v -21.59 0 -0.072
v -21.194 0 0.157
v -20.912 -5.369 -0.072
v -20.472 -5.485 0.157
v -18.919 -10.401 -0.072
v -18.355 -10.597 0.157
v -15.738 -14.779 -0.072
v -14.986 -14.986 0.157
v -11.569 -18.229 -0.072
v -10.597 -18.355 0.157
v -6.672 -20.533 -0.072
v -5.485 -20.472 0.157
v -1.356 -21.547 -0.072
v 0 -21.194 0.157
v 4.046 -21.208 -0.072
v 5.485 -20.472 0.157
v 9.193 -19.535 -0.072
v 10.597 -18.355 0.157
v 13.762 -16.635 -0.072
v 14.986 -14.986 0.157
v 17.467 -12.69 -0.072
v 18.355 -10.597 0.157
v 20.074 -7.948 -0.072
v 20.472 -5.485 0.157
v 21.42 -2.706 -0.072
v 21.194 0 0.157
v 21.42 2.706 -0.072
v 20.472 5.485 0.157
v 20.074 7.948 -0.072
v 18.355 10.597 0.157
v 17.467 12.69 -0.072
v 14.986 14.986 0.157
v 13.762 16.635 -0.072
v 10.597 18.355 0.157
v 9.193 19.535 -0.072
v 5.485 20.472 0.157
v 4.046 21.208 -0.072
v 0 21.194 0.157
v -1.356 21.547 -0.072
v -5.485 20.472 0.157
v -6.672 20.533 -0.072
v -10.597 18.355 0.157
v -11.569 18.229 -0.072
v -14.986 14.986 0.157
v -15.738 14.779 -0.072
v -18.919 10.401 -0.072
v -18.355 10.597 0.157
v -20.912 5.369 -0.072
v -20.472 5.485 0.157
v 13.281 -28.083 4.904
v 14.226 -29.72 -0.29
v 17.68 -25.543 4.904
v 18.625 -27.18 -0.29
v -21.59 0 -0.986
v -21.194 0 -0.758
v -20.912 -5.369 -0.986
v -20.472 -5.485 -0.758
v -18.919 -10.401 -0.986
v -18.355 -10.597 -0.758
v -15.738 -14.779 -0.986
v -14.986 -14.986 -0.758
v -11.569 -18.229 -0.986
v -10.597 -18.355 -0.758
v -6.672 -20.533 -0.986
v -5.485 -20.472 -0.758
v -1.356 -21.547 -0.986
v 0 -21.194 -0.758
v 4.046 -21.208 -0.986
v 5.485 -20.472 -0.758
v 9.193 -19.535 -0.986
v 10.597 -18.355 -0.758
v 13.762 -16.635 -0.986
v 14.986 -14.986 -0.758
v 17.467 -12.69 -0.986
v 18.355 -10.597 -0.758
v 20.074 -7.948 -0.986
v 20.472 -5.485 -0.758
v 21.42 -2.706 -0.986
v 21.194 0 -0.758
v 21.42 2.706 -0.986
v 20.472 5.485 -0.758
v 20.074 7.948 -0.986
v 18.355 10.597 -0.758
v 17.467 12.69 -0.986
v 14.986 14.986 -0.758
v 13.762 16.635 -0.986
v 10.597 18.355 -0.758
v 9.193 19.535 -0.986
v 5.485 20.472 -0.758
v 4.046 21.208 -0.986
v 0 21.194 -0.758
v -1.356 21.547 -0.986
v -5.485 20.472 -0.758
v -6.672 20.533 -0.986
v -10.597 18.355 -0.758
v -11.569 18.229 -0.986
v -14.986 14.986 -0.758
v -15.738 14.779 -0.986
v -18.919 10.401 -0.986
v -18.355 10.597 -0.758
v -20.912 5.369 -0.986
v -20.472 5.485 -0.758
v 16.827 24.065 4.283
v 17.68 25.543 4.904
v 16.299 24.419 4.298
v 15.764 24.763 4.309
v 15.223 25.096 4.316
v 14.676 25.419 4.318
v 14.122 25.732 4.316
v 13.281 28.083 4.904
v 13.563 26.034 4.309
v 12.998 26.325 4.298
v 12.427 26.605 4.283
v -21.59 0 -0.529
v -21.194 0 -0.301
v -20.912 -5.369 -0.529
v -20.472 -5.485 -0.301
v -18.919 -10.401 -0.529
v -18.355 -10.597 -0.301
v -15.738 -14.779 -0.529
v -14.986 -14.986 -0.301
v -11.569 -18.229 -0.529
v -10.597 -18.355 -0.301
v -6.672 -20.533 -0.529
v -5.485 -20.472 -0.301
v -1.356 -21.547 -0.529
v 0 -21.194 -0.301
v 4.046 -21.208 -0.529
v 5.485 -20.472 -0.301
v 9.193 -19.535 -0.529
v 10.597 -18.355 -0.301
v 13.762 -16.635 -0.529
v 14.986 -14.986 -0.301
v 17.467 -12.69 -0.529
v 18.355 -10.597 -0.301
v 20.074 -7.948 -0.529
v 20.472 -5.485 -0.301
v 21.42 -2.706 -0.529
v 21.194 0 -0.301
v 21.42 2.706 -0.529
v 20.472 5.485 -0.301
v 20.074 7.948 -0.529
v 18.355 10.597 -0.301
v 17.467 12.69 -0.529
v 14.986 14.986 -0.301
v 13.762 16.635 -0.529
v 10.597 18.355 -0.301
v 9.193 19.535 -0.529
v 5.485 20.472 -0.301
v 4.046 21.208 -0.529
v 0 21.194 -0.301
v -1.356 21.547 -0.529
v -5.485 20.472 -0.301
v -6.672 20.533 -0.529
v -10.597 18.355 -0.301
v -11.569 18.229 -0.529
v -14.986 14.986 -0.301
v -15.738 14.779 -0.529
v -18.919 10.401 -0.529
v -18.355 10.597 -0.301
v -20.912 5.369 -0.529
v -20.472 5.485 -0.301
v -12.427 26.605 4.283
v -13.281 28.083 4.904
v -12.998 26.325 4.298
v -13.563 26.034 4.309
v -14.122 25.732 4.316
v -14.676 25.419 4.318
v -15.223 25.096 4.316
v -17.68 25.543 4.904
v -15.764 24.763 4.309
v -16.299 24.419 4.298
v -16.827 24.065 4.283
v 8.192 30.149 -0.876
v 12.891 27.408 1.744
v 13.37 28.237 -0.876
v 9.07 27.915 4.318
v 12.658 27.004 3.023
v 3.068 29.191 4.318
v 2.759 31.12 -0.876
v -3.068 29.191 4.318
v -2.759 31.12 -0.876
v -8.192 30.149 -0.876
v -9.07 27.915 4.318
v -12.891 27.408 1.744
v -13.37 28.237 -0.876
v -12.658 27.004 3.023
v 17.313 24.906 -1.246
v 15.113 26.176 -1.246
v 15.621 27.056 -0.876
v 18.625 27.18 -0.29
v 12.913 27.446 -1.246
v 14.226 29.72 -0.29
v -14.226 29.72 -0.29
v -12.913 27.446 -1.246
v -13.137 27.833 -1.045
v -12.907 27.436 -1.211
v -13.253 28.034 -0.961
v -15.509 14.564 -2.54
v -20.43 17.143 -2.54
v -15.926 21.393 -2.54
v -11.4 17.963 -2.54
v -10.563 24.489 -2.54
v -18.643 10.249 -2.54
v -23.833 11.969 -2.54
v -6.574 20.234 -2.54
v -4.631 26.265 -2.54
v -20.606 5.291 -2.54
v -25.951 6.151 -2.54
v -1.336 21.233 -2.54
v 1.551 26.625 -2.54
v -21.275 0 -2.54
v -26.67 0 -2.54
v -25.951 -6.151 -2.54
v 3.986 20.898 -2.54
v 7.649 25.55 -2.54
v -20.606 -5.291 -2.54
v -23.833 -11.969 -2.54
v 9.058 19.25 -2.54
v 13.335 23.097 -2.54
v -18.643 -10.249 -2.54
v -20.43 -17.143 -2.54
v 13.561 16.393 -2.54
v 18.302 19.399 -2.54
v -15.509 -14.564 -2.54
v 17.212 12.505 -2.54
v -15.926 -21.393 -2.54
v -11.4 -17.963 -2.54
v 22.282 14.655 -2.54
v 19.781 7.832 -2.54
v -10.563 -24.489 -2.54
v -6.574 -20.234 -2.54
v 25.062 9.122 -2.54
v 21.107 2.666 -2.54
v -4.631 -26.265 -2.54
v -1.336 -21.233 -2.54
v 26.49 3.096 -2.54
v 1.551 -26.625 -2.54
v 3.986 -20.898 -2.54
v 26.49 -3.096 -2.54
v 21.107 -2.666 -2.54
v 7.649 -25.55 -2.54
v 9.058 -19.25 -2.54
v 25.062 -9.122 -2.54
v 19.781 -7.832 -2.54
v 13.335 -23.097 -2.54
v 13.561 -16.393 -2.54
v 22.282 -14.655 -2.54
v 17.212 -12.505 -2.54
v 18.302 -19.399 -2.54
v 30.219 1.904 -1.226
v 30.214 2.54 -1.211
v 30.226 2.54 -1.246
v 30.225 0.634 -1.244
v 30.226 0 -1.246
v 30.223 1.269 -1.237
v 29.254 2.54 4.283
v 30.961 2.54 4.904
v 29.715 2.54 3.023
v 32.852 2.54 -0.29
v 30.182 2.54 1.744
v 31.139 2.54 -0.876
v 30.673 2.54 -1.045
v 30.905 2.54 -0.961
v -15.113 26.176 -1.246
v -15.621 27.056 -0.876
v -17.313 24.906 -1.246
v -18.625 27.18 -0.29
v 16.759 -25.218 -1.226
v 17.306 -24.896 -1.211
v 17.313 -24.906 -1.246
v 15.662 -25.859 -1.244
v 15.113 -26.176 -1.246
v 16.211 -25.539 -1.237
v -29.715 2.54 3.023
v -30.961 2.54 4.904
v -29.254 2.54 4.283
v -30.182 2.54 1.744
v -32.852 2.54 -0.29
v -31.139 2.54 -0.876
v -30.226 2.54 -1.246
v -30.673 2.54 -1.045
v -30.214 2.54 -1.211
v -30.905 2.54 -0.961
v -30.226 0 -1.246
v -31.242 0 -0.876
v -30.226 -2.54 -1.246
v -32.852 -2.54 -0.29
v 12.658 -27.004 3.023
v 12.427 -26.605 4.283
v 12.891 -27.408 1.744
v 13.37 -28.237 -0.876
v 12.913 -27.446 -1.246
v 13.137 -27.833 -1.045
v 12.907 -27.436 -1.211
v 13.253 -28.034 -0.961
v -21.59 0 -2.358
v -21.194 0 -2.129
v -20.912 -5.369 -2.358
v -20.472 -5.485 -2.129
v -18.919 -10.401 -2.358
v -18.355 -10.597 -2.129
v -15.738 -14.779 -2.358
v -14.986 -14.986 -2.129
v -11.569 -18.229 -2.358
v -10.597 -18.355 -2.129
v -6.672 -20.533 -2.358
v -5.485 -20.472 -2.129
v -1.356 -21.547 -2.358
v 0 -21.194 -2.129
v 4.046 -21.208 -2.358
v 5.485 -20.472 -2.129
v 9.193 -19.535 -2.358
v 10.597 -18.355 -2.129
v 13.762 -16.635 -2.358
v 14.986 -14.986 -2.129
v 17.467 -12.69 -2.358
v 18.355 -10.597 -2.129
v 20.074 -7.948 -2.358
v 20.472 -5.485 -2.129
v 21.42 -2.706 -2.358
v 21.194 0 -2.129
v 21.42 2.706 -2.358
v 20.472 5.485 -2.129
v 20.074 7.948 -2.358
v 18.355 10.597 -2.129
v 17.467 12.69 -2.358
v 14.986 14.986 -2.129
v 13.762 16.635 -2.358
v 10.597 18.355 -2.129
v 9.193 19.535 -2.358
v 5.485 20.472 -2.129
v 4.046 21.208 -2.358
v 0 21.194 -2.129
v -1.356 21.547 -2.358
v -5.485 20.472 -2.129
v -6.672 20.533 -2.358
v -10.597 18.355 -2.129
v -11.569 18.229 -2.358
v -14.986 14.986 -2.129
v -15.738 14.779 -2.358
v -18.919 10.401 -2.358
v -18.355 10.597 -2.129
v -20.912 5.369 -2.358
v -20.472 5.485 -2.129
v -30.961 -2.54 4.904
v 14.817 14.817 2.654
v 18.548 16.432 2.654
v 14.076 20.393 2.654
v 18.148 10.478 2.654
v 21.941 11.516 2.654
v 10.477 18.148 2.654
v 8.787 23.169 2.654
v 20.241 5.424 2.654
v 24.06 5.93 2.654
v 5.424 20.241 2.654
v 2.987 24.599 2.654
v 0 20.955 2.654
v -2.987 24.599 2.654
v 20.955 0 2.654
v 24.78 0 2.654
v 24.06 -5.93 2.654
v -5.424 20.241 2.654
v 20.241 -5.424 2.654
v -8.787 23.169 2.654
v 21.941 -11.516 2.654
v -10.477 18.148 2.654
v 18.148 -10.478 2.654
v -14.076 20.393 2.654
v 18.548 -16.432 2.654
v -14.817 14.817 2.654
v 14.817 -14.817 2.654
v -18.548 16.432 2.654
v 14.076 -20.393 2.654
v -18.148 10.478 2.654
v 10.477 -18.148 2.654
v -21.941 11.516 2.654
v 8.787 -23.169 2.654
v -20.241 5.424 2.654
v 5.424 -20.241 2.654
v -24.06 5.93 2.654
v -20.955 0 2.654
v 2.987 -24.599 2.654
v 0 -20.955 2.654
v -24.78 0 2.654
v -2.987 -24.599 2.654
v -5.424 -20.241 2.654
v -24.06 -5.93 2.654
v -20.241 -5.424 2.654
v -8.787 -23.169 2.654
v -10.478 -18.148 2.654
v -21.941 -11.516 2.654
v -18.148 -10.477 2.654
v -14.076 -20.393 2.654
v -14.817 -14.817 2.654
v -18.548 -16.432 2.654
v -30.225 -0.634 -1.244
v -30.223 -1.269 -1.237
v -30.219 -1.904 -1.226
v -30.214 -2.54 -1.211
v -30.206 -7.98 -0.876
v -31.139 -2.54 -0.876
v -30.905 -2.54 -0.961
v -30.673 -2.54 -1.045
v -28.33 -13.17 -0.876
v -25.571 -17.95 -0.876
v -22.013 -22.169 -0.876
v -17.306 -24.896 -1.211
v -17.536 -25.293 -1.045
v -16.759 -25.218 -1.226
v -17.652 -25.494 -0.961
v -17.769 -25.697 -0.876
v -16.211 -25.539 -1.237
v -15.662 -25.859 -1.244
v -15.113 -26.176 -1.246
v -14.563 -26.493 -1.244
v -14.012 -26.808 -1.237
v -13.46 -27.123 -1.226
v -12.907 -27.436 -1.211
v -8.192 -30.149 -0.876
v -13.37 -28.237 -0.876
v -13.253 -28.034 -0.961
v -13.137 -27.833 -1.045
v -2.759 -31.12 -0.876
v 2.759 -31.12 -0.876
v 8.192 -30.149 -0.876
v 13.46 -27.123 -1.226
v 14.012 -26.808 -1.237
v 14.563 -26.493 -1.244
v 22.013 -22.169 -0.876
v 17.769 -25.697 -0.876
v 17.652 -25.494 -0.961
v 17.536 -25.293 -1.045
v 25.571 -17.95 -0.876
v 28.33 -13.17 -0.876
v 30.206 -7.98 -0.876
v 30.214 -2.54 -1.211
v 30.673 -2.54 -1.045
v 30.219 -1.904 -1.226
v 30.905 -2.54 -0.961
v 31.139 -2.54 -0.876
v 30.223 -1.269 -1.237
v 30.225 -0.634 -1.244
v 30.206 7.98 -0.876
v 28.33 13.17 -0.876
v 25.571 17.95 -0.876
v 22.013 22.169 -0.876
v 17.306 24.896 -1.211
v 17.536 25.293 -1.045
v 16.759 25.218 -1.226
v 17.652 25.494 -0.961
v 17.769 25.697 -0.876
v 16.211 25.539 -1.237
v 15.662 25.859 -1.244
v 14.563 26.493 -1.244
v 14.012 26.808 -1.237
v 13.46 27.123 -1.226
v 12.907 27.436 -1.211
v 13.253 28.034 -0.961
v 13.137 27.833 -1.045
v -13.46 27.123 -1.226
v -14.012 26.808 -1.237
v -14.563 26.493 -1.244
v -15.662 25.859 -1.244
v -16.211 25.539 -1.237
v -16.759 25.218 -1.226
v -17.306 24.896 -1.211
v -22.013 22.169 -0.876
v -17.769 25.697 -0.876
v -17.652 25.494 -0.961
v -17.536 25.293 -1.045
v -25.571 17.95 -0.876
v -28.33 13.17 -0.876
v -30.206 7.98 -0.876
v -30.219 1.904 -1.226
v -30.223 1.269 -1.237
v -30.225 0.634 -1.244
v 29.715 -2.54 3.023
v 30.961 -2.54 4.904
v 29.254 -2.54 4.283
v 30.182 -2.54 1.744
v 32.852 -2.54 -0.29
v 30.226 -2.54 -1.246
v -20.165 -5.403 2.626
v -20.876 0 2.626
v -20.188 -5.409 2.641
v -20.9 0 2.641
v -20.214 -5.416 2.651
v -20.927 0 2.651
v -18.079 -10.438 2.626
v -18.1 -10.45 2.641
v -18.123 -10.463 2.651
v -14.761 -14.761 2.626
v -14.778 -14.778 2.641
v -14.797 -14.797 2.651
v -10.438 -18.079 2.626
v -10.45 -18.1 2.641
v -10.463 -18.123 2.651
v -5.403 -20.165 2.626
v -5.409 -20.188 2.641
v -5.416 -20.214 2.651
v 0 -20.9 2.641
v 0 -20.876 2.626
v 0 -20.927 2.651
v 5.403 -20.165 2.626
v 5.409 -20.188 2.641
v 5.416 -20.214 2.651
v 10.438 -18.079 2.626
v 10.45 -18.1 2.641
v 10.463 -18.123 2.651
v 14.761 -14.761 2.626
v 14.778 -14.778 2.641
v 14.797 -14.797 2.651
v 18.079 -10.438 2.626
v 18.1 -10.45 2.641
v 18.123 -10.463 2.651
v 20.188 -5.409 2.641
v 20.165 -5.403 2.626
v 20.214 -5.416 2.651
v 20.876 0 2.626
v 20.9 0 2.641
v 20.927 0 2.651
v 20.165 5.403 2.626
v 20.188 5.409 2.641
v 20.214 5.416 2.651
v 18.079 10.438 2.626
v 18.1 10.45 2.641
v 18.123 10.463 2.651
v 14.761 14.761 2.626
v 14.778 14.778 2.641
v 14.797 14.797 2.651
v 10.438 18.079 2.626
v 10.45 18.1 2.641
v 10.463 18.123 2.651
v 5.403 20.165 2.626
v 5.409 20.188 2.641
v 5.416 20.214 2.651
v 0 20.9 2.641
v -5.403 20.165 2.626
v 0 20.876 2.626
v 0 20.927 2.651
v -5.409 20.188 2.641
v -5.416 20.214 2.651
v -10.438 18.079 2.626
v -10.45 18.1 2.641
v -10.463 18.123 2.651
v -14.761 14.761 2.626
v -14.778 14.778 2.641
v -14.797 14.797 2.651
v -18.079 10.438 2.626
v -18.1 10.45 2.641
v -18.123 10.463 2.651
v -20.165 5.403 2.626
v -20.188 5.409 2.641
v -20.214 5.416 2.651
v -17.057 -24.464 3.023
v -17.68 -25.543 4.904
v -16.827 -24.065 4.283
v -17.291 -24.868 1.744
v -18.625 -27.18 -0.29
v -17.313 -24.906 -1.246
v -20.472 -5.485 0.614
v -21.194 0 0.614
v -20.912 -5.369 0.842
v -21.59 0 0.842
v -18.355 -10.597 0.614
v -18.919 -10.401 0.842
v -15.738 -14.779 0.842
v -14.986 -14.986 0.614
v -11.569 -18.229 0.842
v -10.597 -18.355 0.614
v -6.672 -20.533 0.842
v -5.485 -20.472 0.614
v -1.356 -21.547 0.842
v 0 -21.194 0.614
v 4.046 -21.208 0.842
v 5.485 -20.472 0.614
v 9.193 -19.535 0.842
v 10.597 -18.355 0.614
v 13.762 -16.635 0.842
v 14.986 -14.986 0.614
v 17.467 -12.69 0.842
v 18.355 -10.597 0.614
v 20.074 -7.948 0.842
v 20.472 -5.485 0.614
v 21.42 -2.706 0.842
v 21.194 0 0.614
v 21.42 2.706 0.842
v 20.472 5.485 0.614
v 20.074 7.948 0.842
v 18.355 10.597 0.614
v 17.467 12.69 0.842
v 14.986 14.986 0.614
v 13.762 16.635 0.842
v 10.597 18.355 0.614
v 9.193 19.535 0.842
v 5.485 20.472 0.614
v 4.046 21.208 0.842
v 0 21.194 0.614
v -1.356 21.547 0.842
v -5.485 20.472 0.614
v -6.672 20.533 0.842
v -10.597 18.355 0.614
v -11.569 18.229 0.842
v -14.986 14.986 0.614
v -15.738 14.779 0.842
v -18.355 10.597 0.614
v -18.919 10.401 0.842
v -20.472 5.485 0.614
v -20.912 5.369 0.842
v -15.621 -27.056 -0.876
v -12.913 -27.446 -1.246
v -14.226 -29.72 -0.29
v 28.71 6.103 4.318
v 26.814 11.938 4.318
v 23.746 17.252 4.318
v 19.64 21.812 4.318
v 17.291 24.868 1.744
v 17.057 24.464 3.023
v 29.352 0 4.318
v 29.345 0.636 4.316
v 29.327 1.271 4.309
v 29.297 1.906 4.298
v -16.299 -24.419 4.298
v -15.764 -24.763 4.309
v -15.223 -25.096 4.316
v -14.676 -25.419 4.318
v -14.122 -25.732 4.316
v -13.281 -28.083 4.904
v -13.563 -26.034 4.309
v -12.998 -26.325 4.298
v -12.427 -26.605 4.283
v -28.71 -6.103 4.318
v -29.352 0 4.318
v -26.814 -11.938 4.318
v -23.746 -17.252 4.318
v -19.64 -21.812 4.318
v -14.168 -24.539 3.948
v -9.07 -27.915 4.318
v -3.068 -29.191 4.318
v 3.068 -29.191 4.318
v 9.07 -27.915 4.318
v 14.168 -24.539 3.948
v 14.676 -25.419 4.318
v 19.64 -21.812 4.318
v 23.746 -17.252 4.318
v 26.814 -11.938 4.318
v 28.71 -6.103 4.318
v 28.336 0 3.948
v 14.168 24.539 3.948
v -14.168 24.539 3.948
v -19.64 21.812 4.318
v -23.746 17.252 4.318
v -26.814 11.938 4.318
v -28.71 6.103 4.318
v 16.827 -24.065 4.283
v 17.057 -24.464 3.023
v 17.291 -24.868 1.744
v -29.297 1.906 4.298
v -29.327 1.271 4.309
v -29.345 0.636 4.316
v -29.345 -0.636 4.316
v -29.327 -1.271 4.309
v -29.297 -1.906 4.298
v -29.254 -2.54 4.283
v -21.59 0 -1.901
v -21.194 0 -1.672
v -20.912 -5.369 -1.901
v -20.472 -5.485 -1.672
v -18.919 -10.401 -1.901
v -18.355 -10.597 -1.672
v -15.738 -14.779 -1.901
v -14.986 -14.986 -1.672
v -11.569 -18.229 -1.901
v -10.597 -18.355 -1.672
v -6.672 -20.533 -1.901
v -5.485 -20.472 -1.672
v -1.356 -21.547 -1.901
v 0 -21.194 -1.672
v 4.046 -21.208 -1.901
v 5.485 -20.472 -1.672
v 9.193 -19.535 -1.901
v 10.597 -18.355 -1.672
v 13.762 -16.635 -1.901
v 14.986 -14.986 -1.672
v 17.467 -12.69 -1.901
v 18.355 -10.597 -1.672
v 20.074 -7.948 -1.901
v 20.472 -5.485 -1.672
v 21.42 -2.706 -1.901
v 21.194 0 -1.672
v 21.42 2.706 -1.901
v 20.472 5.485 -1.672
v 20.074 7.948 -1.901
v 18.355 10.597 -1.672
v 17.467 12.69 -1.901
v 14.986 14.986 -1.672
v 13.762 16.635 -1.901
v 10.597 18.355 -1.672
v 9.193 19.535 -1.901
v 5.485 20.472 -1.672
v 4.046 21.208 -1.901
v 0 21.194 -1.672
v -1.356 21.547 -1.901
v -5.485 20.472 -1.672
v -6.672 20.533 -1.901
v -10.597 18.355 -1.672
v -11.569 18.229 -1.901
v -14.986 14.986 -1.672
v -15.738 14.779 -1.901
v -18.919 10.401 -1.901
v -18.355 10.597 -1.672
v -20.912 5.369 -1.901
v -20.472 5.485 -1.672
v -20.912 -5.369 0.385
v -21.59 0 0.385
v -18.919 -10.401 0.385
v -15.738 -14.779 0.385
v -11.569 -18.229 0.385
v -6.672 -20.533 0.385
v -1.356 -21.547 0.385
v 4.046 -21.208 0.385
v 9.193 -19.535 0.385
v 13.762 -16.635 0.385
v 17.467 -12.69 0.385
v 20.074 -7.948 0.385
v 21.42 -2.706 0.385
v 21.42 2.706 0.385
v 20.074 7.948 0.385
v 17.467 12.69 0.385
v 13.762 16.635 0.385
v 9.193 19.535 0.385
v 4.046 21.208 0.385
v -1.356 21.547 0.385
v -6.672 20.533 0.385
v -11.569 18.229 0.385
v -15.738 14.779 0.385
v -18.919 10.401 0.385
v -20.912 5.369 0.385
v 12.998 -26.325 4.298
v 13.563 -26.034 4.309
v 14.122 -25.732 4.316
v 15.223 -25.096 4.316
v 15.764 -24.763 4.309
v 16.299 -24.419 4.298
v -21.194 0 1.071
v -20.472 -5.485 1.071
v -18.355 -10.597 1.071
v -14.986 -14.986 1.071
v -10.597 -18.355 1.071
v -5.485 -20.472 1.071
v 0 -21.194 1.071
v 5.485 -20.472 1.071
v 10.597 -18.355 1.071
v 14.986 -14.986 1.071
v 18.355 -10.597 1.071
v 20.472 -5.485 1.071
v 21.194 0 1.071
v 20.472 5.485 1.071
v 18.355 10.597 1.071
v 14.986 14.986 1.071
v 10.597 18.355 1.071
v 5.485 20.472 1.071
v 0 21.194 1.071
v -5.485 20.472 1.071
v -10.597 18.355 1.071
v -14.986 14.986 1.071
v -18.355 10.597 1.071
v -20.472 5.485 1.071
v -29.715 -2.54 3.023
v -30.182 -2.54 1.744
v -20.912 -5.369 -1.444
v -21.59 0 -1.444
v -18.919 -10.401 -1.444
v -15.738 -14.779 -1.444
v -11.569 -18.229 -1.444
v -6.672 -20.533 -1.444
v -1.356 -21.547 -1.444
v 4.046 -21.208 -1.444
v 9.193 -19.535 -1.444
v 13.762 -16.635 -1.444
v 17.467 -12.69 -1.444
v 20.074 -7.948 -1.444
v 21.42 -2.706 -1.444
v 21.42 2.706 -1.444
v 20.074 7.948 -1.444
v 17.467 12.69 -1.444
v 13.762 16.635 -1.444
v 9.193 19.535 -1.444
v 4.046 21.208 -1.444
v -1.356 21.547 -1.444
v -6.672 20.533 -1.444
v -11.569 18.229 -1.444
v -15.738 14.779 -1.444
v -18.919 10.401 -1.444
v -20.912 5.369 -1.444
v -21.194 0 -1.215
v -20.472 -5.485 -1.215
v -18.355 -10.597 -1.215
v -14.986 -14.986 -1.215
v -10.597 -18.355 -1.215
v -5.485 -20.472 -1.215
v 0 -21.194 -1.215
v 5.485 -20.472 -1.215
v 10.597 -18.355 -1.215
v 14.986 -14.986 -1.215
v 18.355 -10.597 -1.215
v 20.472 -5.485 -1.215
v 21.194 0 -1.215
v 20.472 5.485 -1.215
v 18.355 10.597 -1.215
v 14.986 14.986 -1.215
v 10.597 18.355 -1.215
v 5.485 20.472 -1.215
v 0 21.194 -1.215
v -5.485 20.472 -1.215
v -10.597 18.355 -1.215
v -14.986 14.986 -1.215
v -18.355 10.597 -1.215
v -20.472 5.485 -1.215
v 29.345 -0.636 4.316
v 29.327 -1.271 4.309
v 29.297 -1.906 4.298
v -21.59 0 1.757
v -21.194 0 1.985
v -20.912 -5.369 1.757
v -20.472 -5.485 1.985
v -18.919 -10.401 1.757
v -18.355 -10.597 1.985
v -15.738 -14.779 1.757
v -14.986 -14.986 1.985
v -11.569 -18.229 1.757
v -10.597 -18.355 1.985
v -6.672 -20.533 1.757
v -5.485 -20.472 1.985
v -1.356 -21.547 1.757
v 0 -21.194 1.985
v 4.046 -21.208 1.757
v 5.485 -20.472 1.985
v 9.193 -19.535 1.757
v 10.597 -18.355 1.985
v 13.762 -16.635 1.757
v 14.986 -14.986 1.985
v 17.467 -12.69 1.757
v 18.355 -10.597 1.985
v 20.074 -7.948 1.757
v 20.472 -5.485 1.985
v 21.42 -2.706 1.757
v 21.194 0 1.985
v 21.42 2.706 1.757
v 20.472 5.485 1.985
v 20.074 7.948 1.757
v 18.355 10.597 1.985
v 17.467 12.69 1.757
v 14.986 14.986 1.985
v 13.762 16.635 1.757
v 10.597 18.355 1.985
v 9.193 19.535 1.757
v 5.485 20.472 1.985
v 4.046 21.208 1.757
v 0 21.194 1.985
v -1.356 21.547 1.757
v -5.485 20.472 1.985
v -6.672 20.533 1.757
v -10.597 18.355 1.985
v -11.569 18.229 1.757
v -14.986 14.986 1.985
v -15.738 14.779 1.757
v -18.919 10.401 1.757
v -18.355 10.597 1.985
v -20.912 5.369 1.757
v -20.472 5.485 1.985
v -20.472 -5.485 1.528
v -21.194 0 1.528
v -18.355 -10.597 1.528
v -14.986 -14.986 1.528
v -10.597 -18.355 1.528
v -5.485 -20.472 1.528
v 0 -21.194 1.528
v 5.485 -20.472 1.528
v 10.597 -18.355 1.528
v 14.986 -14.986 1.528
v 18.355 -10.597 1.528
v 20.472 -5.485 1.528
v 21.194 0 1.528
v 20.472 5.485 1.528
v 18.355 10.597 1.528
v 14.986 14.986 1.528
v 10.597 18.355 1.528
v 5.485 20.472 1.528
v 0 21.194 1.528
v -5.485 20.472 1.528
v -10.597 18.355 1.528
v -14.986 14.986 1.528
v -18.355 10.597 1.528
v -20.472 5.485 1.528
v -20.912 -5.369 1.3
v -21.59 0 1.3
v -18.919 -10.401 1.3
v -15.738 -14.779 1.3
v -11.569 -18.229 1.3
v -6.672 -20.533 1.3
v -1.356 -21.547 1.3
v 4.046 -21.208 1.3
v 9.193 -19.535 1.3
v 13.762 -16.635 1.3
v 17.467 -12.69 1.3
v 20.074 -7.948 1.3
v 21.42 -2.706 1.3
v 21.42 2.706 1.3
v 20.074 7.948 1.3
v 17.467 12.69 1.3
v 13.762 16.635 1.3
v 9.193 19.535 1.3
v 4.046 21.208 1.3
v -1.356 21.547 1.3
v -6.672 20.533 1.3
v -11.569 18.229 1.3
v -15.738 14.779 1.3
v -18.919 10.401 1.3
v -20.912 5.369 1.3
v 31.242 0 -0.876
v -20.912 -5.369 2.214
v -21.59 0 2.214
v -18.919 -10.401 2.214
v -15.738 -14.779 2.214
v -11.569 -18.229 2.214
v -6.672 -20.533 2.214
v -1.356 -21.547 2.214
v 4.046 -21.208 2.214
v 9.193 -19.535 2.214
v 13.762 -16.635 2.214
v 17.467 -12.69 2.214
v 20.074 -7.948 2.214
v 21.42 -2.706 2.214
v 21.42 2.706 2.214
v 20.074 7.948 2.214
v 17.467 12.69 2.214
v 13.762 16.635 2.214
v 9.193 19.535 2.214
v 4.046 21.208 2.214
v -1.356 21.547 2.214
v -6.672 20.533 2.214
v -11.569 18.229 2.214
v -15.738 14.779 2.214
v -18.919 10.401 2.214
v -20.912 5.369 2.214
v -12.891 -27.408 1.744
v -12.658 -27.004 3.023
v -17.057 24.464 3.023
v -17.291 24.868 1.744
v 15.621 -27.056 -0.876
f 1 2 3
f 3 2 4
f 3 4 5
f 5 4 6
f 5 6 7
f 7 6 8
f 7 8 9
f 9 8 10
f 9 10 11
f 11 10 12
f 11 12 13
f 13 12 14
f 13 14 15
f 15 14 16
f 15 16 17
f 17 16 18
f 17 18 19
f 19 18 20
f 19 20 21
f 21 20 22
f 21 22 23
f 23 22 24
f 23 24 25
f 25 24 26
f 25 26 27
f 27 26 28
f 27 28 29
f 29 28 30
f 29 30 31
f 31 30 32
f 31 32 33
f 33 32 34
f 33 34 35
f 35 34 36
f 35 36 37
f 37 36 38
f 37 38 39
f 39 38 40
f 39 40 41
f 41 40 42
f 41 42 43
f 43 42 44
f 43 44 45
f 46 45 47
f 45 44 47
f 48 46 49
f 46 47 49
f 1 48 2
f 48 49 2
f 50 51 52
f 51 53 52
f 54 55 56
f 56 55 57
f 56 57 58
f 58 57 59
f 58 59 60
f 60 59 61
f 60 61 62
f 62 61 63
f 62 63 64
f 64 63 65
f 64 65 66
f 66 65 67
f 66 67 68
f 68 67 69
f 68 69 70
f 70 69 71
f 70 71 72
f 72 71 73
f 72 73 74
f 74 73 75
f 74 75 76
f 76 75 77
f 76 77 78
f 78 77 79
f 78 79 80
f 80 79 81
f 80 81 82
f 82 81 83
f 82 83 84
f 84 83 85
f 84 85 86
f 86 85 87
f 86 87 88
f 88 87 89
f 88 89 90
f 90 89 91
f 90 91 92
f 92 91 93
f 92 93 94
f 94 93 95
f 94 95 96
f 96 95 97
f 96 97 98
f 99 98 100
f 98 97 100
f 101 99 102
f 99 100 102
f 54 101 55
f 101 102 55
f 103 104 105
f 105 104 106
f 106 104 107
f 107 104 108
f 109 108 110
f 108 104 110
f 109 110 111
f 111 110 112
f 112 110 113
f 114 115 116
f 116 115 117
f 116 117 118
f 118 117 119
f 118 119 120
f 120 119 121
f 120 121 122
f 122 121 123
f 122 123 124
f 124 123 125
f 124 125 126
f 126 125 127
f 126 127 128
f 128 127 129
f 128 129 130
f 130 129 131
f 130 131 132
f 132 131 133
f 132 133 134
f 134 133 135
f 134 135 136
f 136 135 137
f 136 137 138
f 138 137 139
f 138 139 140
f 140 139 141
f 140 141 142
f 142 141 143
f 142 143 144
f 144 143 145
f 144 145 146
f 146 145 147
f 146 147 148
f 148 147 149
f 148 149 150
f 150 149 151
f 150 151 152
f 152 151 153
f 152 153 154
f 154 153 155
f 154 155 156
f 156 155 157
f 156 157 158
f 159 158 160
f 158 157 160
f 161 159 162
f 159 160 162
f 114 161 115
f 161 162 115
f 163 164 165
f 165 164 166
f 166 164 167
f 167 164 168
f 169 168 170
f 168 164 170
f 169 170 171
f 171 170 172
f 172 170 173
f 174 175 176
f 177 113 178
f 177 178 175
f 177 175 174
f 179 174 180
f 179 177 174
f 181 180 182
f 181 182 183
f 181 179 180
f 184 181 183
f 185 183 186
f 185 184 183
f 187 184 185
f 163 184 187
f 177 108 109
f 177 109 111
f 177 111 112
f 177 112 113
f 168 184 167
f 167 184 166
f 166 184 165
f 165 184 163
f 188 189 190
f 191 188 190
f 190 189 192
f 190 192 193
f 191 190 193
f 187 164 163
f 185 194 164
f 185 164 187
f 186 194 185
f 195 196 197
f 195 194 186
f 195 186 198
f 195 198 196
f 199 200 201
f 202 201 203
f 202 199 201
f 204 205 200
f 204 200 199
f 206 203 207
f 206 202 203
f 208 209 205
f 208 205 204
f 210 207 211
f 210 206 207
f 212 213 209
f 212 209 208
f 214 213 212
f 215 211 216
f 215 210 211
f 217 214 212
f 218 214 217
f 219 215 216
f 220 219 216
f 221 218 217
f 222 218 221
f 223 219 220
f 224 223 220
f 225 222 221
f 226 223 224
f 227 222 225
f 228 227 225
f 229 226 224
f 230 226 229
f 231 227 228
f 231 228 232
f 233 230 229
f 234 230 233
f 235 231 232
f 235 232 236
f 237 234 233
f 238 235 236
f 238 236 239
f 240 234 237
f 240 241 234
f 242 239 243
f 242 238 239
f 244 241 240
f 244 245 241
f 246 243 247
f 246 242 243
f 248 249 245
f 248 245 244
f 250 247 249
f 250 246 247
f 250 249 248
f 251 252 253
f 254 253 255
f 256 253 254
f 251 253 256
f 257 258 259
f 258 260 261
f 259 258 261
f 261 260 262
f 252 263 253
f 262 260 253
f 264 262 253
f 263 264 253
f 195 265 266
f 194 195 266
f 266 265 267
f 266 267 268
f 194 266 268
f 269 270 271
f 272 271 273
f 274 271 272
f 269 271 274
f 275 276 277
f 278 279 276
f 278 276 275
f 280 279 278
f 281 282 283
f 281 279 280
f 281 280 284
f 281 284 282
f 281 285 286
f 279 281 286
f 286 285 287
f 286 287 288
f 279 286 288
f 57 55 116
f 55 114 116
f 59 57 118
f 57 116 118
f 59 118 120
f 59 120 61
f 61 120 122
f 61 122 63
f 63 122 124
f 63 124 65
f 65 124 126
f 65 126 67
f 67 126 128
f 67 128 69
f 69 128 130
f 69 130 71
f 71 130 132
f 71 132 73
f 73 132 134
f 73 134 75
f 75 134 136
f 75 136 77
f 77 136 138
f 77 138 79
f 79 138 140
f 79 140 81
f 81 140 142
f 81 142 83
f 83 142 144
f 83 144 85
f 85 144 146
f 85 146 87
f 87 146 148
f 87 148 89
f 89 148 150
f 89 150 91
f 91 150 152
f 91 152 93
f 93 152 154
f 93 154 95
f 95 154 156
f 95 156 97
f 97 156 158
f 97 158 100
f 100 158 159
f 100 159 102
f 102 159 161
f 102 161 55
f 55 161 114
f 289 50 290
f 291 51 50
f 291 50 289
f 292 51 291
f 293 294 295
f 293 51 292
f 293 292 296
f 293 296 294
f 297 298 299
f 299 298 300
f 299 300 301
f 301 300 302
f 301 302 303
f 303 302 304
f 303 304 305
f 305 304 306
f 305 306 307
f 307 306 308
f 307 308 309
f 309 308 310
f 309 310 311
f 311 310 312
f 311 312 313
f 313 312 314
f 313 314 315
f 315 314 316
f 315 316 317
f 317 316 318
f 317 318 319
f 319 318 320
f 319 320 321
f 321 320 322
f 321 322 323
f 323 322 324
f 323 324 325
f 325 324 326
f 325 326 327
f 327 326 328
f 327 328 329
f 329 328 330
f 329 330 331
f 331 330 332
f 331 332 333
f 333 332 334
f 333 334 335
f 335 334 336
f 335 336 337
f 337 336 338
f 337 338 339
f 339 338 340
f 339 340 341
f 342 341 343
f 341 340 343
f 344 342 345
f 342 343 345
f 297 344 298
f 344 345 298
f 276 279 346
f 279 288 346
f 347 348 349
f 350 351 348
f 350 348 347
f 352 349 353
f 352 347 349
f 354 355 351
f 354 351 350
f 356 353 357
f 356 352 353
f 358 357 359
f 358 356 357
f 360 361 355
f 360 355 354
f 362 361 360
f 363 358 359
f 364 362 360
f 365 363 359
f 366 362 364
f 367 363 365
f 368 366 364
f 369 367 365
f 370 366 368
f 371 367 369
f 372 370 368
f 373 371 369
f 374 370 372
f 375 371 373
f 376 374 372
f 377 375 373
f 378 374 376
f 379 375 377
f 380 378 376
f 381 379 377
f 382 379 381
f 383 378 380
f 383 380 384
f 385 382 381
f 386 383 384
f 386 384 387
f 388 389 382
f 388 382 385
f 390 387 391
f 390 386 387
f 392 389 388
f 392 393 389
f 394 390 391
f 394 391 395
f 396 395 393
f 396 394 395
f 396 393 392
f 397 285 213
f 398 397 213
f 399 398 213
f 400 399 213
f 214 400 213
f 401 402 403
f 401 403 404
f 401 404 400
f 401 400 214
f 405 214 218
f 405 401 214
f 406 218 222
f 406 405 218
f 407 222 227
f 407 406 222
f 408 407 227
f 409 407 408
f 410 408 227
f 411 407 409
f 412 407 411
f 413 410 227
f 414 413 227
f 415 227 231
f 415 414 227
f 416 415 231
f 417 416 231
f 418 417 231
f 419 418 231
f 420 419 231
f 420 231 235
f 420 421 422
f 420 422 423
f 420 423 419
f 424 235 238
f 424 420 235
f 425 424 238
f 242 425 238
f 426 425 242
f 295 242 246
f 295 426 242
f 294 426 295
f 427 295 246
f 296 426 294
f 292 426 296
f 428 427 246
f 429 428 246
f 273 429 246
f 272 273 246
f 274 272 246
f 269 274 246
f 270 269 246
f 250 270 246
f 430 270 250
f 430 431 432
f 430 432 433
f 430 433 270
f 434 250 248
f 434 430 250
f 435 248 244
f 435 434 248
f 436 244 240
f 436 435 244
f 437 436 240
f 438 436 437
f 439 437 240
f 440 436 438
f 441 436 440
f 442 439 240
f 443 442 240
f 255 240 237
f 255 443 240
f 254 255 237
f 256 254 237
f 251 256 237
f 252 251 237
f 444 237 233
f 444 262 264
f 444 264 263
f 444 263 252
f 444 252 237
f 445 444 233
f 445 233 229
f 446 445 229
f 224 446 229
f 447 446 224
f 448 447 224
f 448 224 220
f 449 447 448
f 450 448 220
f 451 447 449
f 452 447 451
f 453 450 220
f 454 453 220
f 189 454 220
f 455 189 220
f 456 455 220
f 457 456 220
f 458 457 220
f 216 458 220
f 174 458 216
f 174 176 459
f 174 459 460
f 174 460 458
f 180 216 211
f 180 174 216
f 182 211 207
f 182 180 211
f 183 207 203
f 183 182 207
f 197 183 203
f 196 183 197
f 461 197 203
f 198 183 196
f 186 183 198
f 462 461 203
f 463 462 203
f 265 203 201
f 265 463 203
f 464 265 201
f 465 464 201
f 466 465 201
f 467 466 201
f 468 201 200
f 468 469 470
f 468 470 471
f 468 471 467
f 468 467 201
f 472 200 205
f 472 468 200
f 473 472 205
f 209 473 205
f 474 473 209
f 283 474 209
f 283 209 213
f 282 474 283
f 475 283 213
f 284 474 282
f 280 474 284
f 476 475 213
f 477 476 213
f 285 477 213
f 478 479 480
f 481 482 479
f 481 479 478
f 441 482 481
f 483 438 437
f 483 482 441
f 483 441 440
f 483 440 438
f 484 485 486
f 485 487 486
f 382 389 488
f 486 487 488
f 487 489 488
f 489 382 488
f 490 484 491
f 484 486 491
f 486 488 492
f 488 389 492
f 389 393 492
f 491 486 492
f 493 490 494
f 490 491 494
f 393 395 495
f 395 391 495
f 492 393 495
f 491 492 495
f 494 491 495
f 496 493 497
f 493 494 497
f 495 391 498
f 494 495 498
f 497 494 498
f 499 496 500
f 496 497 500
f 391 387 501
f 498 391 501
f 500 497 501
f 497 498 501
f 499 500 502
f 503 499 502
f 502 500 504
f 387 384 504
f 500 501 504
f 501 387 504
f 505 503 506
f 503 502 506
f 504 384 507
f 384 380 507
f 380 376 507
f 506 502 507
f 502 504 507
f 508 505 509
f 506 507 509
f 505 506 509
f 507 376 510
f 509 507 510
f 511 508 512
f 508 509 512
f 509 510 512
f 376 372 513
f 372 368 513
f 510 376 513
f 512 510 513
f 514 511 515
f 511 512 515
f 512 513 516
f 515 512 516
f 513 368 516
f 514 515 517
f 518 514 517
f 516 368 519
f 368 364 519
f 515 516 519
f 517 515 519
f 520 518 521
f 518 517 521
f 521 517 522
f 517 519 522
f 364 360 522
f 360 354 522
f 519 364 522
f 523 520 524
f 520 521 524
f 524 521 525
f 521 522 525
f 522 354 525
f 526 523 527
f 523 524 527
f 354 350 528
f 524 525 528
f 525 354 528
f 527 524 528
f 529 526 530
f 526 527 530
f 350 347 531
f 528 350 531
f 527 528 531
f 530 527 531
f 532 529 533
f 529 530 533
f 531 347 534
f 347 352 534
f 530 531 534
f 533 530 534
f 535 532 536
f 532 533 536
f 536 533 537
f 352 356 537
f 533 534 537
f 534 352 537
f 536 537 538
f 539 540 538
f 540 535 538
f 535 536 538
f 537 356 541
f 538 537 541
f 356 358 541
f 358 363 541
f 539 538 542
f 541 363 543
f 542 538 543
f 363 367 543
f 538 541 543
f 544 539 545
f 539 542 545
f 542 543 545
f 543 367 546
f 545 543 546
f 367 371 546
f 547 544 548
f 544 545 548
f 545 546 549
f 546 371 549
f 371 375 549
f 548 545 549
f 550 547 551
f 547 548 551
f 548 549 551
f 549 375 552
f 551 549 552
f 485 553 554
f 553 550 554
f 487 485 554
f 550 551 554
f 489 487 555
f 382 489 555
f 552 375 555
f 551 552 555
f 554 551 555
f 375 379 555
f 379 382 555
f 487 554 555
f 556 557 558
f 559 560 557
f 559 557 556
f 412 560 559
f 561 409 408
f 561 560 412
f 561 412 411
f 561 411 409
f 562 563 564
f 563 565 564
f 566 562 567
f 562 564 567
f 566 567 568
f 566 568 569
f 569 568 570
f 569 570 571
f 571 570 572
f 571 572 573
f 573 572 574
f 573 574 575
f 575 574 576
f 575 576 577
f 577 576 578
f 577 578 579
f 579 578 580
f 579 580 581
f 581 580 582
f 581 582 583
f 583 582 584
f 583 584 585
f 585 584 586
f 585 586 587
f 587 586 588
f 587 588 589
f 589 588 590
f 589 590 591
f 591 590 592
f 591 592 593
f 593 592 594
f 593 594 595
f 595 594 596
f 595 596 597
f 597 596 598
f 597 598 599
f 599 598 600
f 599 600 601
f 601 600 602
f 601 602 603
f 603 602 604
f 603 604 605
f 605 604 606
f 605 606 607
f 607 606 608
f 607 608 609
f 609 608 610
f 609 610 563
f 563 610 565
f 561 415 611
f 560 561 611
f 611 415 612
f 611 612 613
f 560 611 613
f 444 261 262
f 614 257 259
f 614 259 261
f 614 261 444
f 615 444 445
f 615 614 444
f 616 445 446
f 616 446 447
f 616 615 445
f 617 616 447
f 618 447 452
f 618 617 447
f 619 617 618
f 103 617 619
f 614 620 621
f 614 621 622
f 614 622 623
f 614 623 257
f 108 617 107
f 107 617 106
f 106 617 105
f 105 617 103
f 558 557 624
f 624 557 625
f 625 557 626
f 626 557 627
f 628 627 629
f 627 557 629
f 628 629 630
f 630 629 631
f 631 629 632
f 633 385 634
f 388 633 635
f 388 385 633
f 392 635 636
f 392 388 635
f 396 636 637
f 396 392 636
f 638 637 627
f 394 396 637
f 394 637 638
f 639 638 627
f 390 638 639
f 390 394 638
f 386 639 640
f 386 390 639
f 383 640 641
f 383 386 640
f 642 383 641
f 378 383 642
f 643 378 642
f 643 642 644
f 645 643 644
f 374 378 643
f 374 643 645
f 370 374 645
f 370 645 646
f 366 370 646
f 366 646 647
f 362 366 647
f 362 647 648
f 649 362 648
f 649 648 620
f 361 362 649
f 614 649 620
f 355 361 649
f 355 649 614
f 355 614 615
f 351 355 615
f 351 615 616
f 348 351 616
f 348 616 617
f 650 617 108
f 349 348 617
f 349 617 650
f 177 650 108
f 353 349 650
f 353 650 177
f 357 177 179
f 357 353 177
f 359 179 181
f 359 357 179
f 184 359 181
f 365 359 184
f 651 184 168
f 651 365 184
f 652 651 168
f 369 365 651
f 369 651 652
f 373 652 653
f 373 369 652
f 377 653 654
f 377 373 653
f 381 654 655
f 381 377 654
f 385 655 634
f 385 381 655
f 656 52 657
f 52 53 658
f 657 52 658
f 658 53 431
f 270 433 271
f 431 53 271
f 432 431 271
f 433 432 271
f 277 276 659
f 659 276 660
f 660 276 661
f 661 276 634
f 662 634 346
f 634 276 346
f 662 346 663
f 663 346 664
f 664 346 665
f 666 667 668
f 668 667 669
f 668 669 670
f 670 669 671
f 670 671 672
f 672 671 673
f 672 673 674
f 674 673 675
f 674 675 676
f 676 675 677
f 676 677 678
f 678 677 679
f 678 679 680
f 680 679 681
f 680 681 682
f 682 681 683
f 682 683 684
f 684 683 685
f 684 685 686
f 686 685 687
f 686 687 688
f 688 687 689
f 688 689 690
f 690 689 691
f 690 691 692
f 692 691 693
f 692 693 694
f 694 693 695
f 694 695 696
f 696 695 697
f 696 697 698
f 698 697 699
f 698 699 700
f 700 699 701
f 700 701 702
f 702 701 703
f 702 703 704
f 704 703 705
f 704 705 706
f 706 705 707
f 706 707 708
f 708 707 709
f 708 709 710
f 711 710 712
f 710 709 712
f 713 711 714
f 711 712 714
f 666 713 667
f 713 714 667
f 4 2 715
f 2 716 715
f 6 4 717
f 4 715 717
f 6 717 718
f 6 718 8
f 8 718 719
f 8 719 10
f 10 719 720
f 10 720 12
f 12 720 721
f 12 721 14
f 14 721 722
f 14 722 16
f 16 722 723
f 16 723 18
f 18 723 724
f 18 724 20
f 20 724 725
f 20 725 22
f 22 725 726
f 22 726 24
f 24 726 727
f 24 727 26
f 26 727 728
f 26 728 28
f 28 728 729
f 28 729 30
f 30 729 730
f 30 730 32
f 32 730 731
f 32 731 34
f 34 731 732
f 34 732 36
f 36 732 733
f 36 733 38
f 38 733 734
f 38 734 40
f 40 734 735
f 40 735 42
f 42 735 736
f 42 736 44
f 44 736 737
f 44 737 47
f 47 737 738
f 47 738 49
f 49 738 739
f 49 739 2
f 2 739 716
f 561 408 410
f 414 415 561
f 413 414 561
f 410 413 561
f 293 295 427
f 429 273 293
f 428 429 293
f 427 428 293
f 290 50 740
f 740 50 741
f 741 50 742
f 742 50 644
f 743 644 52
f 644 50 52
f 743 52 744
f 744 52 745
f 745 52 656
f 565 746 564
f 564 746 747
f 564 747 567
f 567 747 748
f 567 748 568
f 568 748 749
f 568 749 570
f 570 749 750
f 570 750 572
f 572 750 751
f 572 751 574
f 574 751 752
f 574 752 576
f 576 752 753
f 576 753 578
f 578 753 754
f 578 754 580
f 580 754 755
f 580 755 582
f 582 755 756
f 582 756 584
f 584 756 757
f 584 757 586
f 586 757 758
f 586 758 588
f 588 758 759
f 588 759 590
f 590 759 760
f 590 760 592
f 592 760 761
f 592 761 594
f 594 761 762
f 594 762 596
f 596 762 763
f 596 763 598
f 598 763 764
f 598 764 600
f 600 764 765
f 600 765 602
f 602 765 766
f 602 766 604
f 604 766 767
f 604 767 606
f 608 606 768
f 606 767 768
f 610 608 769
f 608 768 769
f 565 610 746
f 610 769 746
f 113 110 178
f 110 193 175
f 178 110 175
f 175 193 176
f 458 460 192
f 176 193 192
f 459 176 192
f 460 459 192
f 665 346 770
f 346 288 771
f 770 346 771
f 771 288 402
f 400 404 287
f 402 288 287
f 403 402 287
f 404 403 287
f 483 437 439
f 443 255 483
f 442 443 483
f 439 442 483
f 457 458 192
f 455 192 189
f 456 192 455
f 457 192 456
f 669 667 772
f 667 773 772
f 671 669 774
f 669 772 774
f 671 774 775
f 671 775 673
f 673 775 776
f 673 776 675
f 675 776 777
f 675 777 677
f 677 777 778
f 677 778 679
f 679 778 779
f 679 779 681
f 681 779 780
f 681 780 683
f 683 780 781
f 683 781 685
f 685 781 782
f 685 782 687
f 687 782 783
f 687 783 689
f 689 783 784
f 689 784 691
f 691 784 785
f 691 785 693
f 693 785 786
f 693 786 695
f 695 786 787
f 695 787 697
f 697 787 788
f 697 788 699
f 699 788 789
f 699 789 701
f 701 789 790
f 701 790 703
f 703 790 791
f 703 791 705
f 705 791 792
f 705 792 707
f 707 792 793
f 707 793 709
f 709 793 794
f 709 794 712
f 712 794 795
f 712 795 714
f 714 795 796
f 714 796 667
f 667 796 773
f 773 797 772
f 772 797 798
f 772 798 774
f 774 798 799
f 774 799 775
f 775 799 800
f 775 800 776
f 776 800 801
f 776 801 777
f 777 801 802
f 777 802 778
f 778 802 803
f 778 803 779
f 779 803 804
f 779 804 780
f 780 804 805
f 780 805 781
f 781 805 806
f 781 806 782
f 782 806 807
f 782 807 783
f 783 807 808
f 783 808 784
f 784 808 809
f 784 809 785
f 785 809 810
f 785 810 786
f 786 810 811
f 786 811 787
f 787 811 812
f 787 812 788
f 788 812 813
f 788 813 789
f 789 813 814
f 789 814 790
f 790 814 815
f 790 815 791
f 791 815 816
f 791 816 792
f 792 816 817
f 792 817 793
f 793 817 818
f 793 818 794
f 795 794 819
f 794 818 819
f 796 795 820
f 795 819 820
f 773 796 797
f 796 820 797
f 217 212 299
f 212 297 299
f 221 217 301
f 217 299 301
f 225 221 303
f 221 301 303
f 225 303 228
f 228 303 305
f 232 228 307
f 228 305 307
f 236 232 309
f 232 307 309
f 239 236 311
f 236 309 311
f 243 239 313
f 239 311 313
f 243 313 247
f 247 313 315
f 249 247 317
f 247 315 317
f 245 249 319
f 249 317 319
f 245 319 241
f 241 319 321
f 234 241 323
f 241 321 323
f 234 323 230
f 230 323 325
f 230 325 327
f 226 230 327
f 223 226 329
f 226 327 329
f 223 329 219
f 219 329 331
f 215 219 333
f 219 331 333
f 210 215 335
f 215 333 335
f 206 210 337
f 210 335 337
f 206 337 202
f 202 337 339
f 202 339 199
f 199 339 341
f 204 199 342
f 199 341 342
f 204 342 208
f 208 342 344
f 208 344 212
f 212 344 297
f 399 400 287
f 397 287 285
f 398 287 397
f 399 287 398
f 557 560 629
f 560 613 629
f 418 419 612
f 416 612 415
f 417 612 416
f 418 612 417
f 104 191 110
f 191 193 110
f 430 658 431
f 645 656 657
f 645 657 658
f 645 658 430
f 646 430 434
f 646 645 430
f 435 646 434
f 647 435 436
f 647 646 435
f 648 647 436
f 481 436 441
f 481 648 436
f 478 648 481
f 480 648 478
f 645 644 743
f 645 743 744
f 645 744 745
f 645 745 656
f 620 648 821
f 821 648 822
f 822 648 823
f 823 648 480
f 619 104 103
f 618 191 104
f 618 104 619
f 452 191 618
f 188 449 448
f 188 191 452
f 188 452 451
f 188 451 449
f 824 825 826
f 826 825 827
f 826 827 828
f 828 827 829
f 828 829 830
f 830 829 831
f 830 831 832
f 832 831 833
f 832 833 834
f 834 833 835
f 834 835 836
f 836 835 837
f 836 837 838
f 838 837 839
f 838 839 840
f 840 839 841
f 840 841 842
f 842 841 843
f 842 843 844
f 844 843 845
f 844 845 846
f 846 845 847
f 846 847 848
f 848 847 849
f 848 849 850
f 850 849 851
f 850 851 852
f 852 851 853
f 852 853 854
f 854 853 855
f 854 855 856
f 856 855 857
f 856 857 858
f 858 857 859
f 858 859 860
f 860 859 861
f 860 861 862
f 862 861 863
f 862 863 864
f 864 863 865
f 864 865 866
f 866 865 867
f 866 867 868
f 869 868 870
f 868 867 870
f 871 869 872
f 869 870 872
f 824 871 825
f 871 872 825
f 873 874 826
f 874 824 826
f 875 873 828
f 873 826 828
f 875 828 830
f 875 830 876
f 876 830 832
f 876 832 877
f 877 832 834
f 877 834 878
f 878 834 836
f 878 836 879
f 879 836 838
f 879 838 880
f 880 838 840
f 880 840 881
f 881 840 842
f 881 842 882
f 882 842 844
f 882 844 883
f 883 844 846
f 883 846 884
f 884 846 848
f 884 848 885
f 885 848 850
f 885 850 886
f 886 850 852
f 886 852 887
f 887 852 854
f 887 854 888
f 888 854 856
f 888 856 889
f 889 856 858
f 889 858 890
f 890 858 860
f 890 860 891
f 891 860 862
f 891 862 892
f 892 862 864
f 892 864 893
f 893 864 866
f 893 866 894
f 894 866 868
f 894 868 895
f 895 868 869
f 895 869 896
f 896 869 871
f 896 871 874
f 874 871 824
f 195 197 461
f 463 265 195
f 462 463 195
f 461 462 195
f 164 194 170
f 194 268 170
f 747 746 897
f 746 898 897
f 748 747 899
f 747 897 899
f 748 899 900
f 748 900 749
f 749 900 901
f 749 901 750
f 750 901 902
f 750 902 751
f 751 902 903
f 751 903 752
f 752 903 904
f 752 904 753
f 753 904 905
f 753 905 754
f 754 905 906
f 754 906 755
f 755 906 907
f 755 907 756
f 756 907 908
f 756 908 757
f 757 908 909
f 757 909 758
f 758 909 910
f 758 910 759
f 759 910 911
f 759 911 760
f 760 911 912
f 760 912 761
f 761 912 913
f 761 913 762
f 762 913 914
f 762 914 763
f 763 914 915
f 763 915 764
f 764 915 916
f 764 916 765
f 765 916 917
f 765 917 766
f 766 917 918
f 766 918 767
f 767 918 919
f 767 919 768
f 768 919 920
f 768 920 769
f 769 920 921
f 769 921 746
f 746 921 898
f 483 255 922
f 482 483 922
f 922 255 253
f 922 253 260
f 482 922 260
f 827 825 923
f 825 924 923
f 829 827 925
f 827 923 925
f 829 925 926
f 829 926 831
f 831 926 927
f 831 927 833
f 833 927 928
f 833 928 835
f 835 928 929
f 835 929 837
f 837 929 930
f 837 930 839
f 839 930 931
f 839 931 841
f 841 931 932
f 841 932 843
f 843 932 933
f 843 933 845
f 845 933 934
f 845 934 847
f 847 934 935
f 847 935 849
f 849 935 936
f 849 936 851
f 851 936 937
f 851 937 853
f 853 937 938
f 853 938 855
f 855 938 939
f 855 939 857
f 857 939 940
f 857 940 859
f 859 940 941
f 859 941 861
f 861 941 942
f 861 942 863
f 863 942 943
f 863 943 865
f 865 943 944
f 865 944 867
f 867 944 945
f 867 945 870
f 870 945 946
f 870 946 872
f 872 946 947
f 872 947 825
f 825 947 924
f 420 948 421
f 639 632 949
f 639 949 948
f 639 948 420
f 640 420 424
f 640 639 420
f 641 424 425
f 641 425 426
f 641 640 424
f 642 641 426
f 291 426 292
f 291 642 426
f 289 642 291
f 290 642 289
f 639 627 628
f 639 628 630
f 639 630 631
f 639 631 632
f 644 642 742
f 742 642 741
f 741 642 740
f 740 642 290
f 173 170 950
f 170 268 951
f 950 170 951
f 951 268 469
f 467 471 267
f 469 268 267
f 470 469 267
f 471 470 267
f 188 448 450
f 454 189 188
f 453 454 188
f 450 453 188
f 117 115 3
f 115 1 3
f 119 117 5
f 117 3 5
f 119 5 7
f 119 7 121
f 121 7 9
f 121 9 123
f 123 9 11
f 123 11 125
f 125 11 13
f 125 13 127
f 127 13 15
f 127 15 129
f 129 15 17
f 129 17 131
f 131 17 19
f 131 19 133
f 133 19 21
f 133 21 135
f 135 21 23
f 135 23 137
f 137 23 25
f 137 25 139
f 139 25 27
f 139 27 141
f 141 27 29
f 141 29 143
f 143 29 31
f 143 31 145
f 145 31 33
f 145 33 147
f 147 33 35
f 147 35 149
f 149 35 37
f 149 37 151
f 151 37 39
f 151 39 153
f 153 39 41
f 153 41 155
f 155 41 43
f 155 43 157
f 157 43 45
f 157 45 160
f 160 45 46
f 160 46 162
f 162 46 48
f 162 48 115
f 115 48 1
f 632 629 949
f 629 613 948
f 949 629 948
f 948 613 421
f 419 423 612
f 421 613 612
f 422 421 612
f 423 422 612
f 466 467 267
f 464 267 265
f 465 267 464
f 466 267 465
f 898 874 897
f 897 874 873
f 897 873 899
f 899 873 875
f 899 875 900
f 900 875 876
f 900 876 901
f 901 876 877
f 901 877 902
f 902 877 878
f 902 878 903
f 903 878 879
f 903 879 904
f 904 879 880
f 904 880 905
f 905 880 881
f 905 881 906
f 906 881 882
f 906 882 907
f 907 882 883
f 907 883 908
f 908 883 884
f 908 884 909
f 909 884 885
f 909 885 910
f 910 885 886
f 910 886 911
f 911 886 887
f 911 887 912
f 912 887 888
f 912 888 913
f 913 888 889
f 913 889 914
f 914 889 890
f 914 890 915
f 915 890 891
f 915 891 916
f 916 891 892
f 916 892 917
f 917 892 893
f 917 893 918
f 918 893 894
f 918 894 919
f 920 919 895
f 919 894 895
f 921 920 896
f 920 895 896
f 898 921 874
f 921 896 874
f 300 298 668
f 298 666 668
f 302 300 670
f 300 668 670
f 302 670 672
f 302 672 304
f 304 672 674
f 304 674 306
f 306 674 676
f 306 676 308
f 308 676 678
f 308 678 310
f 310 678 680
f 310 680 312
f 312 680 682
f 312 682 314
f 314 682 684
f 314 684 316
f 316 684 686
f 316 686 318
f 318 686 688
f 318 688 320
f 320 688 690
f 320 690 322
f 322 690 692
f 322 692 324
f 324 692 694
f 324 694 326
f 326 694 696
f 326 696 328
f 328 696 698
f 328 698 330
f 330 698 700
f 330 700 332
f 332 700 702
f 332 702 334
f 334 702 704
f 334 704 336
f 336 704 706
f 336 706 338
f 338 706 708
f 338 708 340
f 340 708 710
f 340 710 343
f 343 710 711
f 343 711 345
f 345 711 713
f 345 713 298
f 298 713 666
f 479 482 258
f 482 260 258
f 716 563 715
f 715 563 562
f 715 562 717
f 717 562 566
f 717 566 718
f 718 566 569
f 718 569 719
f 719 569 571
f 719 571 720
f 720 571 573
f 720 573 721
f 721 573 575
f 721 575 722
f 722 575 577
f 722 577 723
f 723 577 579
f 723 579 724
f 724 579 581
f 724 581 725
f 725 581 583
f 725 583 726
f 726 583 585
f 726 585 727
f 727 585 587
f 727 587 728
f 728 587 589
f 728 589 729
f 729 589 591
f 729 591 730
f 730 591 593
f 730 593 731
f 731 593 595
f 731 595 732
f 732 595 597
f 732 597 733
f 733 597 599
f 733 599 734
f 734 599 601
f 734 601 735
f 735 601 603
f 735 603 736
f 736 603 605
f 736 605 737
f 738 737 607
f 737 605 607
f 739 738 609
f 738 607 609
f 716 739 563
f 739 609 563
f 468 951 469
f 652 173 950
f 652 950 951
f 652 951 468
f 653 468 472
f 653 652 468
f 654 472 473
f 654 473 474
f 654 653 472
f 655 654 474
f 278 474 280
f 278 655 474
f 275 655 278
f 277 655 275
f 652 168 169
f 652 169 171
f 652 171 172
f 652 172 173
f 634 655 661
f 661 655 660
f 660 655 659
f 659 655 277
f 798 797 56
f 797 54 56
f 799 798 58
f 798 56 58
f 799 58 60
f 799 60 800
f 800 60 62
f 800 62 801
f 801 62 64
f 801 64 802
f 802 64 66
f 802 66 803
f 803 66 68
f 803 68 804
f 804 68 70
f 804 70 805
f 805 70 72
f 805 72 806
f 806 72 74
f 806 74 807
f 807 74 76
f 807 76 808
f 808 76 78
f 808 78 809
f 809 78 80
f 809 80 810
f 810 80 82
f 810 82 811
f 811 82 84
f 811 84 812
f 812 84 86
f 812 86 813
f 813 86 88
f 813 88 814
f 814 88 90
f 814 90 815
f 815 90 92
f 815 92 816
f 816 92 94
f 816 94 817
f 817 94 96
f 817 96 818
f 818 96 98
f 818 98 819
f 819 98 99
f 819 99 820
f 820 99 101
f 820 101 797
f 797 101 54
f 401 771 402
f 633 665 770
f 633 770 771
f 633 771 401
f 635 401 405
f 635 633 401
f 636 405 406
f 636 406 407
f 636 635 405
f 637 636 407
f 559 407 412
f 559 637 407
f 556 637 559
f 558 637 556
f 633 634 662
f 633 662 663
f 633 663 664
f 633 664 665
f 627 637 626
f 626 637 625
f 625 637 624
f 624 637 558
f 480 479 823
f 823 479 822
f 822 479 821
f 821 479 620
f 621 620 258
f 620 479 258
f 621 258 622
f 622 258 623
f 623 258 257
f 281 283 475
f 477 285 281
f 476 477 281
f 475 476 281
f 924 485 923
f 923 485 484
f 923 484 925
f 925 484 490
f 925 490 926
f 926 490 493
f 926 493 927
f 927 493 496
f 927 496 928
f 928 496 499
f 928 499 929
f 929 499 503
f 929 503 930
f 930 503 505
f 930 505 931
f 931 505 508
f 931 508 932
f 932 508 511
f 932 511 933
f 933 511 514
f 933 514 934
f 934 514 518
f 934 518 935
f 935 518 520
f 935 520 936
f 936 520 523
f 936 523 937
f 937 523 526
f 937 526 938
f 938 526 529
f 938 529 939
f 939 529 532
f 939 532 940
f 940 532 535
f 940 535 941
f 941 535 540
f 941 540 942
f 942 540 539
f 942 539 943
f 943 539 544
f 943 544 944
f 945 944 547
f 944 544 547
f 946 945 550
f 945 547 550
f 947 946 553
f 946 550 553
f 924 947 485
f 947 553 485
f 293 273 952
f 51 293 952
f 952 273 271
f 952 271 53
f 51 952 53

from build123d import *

# Parameters (mm, degrees)
EXTRUDE3_DEPTH    = 2.54
CIRPATTERN1_COUNT = 6
FILLET4_R         = 0.127
LPATTERN1_COUNT   = 11
LPATTERN1_PITCH   = 0.4572


with BuildPart() as part:
    # Sketch1 → Revolve1 (revolve)
    with BuildSketch(Plane(origin=(0, 0, 0), x_dir=(1, 0, 0), z_dir=(0, 1, 0)), mode=Mode.PRIVATE) as revolve1_sk:
        Polygon((20.828, 2.54), (26.67, 2.54), (31.242, 0.875928089), (29.351564777, -4.318), (24.779564777, -2.653928089), (20.828, -2.653928089), align=None)
    revolve(revolve1_sk.sketch.rotate(Axis((0, 0, -37.83814433), (0, 0, 1)), 180), axis=Axis((0, 0, -37.83814433), (0, 0, 1)))  # turned: the seam where the file's is

    # Sketch3 → Extrude3 (add, symmetric)
    with BuildSketch(Plane(origin=(0, 0, 0), x_dir=(1, 0, 0), z_dir=(0, 1, 0))):
        Polygon((30.226, 1.245721847), (32.851501182, 0.290117566), (30.961065959, -4.903810522), (28.335564777, -3.948206242), align=None)
    extrude3 = extrude(amount=EXTRUDE3_DEPTH, both=True)

    # CirPattern1: Extrude3 ×6 about axis
    cirpattern1_axis = Axis((0, 0, 0), (0, 0, 1))
    for i in range(1, CIRPATTERN1_COUNT):
        add(extrude3.rotate(cirpattern1_axis, i * 360 / CIRPATTERN1_COUNT))

    # Fillet4
    fillet4_edges = [part.edges().sort_by_distance(p)[0] for p in [
        (20.828, 0, 2.653928089),
        (20.828, 0, -2.54),
    ]]
    fillet(fillet4_edges, radius=FILLET4_R)

    # Sketch4 → Cut-Revolve1 (revolve, cut)
    with BuildSketch(Plane(origin=(0, 0, 0), x_dir=(1, 0, 0), z_dir=(0, 1, 0))):
        Polygon((-20.828, -2.653928089), (-20.828, -1.774046279), (-21.59, -2.213987184), align=None)
    cut_revolve1 = revolve(axis=Axis((0, 0, -37.83814433), (0, 0, 1)), mode=Mode.SUBTRACT)

    # LPattern1: Cut-Revolve1 ×11
    with Locations(*[(0, 0, -i * LPATTERN1_PITCH) for i in range(1, LPATTERN1_COUNT)]):
        add(cut_revolve1, mode=Mode.SUBTRACT)


solid = part.part
